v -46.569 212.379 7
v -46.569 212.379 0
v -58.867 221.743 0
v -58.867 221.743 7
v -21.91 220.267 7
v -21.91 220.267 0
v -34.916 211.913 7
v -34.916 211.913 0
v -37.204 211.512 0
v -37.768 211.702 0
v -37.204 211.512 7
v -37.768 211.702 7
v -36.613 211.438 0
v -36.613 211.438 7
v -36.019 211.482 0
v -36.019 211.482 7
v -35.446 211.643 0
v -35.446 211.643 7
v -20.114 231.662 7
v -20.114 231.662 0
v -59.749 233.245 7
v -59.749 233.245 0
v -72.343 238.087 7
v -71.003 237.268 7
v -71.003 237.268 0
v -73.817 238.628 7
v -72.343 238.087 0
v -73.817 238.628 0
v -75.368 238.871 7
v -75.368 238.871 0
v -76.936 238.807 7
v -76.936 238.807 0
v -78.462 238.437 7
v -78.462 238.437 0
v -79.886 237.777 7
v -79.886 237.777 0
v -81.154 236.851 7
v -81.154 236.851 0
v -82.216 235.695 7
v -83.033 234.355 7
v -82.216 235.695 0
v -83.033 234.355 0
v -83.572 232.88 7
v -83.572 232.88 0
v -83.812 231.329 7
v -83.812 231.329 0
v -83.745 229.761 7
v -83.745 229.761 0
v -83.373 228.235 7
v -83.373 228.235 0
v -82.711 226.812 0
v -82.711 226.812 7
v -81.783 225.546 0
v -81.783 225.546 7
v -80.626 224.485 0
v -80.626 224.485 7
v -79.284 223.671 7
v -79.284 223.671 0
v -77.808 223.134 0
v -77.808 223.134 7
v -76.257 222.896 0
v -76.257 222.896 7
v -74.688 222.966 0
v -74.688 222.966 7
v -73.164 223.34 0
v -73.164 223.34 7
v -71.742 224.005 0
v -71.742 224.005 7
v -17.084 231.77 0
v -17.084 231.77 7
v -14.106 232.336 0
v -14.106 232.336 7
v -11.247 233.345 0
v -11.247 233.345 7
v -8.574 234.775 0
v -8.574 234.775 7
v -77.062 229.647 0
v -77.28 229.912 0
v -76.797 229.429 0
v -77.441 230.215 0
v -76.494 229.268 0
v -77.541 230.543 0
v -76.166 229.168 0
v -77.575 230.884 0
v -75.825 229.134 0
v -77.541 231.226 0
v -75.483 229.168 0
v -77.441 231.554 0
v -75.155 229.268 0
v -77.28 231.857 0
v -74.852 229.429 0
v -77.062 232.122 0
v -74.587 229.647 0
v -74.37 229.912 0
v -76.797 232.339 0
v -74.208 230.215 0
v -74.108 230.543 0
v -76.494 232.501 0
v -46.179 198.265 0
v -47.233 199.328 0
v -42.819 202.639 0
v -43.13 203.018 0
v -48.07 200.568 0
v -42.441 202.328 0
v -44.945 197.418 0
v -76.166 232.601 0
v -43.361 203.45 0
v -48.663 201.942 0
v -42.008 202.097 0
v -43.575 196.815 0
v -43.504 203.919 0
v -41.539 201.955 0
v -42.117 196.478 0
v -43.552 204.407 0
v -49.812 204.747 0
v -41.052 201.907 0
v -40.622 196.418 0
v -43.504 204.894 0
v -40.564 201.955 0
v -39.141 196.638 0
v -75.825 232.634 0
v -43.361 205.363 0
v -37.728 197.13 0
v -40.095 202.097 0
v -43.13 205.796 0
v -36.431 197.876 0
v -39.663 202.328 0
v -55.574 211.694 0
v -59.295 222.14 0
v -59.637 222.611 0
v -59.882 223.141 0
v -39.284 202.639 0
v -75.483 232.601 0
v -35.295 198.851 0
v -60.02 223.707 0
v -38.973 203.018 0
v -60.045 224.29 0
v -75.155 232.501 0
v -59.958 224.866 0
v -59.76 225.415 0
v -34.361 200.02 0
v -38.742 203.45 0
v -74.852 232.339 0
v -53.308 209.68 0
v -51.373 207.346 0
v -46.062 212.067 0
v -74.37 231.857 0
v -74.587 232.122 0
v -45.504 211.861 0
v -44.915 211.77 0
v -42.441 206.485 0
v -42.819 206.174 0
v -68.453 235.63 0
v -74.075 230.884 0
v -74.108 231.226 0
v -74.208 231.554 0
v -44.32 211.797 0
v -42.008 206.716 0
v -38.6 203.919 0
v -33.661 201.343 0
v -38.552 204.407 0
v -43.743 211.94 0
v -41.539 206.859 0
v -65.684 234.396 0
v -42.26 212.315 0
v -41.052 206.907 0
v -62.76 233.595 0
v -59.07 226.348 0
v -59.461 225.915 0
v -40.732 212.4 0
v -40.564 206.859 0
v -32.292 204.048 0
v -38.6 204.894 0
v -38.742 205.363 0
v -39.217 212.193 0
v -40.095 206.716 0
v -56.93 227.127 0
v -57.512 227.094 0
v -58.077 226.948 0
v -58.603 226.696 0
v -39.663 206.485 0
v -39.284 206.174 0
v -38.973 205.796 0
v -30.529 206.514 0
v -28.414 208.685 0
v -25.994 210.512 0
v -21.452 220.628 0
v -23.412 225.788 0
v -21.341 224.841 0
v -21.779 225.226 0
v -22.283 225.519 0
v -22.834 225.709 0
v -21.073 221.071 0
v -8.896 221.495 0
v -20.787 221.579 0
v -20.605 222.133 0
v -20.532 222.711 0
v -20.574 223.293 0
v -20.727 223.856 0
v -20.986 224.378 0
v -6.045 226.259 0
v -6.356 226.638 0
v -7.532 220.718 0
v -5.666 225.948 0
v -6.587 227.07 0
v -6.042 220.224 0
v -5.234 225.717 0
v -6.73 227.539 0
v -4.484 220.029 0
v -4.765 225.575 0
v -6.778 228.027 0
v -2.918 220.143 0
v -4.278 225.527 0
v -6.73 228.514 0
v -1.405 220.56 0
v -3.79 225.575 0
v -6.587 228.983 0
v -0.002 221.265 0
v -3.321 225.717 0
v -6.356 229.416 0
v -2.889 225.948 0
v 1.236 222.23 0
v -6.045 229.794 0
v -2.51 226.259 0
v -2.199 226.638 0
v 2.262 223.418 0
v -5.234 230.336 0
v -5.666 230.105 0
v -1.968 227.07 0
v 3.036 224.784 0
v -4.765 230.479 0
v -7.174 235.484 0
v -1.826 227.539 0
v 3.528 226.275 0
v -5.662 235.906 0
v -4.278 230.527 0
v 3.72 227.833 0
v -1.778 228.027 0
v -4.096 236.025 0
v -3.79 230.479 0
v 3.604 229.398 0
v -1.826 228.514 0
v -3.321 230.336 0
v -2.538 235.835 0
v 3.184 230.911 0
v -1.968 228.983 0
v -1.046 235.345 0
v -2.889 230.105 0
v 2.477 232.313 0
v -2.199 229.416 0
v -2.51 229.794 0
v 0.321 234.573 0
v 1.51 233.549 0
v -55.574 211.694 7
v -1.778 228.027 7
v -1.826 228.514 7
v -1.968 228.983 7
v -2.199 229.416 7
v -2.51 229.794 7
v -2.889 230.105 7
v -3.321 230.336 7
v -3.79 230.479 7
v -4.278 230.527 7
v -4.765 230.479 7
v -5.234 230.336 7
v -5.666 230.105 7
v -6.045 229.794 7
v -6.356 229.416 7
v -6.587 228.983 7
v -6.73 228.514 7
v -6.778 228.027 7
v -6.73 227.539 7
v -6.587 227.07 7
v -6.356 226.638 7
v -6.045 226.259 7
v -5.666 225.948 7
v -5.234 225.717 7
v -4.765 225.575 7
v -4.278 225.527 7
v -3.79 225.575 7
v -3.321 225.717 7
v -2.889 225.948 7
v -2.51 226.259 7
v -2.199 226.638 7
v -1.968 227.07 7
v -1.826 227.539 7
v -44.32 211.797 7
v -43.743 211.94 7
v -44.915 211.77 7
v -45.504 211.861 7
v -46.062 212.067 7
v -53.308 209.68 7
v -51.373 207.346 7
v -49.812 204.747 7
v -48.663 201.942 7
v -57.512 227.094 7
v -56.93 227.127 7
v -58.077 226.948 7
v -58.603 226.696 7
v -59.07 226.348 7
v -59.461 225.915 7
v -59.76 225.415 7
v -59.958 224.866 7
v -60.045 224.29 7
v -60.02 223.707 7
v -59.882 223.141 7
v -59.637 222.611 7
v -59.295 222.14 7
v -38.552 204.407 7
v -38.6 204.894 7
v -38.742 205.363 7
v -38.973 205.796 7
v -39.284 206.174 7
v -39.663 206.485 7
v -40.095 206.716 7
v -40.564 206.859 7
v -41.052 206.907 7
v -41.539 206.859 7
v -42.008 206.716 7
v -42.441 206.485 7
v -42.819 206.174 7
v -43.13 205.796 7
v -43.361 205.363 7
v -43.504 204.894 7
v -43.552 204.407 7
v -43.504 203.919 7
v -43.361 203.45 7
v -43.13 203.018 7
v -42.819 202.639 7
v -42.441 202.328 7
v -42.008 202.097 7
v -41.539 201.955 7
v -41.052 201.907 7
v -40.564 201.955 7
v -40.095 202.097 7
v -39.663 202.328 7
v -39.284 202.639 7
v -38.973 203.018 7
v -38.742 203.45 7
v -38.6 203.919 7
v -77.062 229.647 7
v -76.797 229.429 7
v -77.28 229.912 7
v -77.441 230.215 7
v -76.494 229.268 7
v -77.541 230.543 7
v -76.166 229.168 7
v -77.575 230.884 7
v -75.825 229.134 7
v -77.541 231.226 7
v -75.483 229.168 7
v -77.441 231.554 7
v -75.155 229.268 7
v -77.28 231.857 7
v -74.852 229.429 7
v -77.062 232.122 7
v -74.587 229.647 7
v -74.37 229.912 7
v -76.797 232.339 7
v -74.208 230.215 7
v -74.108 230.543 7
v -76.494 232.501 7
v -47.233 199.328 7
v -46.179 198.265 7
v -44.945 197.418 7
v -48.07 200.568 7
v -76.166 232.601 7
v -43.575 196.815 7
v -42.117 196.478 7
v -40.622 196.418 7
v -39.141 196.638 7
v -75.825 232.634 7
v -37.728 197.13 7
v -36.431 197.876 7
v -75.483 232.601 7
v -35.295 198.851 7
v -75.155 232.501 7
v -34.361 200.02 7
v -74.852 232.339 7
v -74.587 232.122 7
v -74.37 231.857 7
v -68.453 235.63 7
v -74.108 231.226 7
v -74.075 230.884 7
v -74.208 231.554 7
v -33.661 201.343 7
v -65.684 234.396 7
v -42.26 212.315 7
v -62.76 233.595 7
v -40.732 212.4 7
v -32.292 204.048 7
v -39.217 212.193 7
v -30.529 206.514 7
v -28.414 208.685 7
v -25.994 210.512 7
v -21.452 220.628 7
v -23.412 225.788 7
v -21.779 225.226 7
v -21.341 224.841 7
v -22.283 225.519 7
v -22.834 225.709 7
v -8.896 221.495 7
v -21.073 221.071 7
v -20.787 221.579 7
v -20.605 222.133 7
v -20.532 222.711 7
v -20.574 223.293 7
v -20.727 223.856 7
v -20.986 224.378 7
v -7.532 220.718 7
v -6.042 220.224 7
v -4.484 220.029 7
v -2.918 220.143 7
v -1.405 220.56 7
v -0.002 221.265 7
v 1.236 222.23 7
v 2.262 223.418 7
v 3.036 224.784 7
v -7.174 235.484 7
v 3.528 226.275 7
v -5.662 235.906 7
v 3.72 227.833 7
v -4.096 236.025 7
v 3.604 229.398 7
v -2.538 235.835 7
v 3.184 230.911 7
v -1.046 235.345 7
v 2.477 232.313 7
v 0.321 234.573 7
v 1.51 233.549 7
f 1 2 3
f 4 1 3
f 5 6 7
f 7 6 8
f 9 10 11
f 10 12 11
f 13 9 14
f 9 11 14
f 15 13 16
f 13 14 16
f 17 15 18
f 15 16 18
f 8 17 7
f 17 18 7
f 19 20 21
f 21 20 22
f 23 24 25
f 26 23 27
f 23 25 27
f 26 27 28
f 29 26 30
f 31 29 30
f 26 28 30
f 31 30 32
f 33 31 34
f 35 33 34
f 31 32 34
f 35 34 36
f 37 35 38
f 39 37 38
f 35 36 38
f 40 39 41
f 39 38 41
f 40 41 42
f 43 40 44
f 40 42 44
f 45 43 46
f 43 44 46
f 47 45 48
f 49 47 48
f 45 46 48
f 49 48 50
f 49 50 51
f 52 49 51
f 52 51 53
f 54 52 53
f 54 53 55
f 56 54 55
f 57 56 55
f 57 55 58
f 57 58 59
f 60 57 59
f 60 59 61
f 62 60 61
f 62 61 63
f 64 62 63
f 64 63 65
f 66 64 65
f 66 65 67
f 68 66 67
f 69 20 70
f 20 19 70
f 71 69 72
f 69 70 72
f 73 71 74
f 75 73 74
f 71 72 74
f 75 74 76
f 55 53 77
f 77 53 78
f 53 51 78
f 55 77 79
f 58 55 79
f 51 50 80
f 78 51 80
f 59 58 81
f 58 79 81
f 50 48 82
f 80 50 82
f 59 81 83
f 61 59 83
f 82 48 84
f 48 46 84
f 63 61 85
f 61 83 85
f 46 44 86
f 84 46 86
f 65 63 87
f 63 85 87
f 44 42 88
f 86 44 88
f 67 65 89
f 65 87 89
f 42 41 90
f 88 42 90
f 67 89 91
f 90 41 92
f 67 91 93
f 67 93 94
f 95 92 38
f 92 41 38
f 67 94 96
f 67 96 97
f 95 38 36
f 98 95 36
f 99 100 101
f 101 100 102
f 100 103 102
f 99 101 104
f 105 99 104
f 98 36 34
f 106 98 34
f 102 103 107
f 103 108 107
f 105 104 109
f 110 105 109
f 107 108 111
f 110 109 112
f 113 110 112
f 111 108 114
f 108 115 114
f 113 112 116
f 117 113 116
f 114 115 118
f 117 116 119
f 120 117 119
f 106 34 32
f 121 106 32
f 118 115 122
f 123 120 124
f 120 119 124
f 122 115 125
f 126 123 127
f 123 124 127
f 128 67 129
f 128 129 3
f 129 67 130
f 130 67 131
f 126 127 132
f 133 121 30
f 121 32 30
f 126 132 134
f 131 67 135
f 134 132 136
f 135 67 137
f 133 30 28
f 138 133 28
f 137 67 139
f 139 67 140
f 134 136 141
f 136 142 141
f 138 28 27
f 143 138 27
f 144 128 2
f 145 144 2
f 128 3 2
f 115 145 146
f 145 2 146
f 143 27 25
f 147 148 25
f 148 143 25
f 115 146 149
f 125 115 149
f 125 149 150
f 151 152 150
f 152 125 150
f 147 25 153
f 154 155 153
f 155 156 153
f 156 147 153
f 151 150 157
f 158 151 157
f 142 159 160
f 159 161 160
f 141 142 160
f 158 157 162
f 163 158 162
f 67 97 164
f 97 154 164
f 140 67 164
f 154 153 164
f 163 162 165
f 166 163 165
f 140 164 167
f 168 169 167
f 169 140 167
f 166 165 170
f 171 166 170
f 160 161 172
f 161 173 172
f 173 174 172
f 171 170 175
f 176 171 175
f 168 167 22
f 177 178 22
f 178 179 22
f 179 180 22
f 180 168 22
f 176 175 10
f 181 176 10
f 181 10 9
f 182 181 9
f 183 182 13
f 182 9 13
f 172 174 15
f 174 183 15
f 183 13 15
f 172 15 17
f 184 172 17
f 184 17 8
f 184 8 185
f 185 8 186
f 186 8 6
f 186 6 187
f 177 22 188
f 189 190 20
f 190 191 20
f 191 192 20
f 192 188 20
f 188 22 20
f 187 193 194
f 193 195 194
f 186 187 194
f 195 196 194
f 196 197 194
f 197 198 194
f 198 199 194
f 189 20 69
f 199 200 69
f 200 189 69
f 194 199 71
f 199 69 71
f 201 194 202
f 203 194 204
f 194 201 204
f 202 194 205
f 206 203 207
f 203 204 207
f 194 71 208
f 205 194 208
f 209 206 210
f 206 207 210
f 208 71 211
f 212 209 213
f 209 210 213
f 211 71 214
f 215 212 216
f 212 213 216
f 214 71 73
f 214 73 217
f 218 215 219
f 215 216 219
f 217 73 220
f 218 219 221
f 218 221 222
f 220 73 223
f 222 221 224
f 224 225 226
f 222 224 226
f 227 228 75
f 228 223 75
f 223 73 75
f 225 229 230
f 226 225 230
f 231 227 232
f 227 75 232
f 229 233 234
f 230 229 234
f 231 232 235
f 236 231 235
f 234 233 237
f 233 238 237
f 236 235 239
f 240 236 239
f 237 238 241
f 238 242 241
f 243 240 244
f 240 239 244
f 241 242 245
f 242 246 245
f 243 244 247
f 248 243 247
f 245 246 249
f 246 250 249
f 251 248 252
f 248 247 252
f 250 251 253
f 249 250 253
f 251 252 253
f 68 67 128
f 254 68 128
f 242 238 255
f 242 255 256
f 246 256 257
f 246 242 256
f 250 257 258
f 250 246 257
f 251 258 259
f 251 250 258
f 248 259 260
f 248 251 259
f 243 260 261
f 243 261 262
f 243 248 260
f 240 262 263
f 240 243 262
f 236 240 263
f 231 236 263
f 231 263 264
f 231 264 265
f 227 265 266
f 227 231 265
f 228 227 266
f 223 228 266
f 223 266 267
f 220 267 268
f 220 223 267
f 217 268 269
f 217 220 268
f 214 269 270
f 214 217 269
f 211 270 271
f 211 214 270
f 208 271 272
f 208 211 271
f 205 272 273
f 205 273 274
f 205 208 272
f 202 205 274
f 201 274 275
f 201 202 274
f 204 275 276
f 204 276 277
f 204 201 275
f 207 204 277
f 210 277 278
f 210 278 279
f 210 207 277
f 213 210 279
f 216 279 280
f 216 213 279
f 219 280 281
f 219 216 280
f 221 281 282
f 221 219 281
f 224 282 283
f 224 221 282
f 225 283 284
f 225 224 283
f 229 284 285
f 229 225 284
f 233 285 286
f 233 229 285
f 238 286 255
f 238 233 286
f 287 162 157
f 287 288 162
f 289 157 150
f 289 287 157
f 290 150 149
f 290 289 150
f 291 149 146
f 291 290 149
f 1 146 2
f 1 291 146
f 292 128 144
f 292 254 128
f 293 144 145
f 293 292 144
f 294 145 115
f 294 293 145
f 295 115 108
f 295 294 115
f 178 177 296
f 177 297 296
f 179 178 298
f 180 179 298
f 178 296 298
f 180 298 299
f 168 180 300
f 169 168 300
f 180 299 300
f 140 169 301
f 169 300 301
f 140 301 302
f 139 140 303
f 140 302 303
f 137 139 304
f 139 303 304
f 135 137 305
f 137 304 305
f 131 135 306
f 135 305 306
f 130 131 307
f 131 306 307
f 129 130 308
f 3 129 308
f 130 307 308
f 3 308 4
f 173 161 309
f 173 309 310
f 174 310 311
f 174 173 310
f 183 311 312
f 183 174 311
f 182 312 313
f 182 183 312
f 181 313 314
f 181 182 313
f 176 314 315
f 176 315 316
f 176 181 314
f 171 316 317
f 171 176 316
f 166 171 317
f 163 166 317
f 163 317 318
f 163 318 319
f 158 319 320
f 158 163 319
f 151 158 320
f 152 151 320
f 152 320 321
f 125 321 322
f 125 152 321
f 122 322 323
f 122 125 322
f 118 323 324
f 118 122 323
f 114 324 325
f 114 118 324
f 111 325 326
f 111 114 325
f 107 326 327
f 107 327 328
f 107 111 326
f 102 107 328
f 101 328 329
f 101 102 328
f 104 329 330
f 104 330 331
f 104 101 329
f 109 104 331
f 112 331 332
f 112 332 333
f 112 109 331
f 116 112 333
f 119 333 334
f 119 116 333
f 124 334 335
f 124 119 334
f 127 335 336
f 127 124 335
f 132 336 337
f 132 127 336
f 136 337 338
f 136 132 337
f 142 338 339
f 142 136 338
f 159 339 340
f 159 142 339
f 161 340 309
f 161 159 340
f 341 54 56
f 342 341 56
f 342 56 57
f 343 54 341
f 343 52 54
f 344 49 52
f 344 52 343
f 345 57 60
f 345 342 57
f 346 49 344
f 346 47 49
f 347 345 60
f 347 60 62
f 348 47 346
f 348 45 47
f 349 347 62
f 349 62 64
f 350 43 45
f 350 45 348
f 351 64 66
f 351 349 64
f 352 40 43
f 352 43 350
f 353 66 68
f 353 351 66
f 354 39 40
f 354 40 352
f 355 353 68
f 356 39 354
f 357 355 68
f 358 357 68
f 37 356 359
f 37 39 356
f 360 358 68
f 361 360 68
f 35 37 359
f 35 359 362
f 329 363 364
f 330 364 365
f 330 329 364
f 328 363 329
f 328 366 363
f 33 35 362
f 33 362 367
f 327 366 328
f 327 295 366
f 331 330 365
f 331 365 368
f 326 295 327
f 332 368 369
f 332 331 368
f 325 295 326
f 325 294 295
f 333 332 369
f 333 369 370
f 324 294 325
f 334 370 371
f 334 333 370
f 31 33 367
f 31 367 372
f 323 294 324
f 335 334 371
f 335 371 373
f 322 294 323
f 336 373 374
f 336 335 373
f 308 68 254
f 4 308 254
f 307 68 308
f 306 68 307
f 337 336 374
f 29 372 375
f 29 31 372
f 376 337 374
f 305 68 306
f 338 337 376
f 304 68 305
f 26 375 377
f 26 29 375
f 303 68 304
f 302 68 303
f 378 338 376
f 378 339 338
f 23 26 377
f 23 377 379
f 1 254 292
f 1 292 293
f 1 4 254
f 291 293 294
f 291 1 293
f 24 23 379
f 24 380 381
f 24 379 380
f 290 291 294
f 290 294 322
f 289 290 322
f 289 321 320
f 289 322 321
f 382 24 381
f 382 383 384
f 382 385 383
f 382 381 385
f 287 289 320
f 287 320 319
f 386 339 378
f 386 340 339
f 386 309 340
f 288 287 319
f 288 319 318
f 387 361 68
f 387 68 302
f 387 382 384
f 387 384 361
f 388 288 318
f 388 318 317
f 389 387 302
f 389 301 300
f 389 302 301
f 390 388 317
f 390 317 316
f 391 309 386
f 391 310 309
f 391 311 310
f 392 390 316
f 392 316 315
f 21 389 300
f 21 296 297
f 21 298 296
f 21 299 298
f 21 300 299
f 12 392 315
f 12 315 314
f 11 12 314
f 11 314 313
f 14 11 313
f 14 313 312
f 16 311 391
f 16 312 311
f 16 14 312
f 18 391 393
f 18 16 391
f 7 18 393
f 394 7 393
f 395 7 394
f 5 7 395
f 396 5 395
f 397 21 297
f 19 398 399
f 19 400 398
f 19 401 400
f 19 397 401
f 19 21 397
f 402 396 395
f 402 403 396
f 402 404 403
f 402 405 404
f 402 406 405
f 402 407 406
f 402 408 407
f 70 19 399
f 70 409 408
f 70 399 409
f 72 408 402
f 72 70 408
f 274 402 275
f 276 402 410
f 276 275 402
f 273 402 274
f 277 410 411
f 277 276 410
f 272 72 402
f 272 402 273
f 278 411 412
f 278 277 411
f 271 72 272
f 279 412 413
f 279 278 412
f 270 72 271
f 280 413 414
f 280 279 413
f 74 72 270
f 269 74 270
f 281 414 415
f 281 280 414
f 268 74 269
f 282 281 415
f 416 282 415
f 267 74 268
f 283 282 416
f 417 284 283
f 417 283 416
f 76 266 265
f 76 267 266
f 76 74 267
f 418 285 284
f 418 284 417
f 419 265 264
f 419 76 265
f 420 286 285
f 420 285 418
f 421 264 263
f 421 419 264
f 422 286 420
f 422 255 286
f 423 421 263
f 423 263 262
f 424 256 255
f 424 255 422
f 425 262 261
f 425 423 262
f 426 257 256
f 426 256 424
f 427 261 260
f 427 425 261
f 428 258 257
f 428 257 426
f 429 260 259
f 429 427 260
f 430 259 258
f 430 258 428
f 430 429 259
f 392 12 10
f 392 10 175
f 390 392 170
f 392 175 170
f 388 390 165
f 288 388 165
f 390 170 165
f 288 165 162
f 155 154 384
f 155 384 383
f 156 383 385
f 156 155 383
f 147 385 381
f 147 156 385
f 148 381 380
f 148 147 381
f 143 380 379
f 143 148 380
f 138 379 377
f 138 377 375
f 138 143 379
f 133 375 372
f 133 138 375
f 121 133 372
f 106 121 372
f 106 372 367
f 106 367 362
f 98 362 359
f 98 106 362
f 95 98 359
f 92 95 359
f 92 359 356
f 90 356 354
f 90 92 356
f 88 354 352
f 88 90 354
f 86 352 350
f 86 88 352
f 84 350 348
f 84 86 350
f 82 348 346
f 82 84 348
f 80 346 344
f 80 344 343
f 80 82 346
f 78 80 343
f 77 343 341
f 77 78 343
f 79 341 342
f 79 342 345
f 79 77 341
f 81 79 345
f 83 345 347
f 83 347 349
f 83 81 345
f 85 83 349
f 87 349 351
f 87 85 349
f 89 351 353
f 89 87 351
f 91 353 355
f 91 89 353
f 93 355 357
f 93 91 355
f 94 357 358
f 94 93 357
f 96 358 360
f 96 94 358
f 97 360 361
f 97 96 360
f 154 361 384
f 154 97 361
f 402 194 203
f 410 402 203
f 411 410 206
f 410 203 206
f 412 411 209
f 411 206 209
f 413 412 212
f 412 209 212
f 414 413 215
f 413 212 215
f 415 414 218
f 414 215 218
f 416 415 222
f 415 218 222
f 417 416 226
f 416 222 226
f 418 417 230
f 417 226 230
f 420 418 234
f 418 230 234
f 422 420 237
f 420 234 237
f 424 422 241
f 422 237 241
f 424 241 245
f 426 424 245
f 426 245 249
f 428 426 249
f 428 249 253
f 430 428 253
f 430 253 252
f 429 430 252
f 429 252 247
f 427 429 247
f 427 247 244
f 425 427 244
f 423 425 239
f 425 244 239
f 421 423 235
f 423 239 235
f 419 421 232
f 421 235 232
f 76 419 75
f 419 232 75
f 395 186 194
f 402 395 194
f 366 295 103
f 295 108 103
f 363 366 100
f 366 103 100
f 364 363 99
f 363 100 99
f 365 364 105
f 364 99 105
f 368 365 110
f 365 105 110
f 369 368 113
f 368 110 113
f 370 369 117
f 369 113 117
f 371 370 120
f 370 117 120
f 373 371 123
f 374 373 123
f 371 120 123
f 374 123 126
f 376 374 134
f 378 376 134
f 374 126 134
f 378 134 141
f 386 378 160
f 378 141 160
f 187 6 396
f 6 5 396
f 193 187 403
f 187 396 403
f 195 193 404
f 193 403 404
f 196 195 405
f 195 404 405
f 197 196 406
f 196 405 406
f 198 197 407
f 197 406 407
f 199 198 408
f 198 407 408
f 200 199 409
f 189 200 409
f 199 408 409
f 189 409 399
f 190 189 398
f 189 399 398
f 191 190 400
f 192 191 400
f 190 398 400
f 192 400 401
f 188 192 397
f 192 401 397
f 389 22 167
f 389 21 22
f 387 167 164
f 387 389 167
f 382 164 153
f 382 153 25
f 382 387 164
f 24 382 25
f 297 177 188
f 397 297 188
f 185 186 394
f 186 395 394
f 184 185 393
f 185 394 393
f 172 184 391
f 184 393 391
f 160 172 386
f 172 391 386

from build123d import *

# Parameters (mm, degrees)
SKETCH2_R             = 8
SKETCH2_R_2           = 2.5
BOSS_EXTRUDE2_DEPTH   = 7
BOSS_EXTRUDE2_2_DEPTH = 7
SKETCH2_R_3           = 1.75
BOSS_EXTRUDE2_3_DEPTH = 7
BOSS_EXTRUDE3_DEPTH   = 7
FILLET4_R             = 3
FILLET5_R             = 20
FILLET6_R             = 20


with BuildPart() as part:
    # Sketch2 → Boss-Extrude2 (new body)
    with BuildSketch(Plane.XY):
        with Locations((-41.051610566, 204.406598272)):
            Circle(SKETCH2_R)
        with Locations((-41.051610566, 204.406598272)):
            Circle(SKETCH2_R_2, mode=Mode.SUBTRACT)
    extrude(amount=BOSS_EXTRUDE2_DEPTH)



with BuildPart() as body_2:
    # Sketch2 → Boss-Extrude2 2 (new body)
    with BuildSketch(Plane.XY):
        with Locations((-4.277553922, 228.026598272)):
            Circle(SKETCH2_R)
        with Locations((-4.277553922, 228.026598272)):
            Circle(SKETCH2_R_2, mode=Mode.SUBTRACT)
    extrude(amount=BOSS_EXTRUDE2_2_DEPTH)


with BuildPart() as body_3:
    # Sketch2 → Boss-Extrude2 3 (new body)
    with BuildSketch(Plane.XY):
        with Locations((-75.824618393, 230.884392152)):
            Circle(SKETCH2_R)
        with Locations((-75.824618394, 230.884392152)):
            Circle(SKETCH2_R_3, mode=Mode.SUBTRACT)
    extrude(amount=BOSS_EXTRUDE2_3_DEPTH)


with BuildPart() as part_1:
    add(part.part)

    add(body_2.part)  # Boss-Extrude3 merges body 2

    add(body_3.part)  # Boss-Extrude3 merges body 3
    # Sketch2<6> → Boss-Extrude3 (add)
    with BuildSketch(Plane.XY):
        with BuildLine():
            ThreePointArc((-36.432963635, 210.938680676), (-34.320479367, 208.730008128), (-33.190406244, 205.890332276))
            Line((-33.190406244, 205.890332276), (-8.896200854, 221.494515869))
            ThreePointArc((-8.896200854, 221.494515869), (-11.997222262, 225.927379197), (-11.568110377, 231.32019609))
            Line((-11.568110377, 231.32019609), (-68.294595771, 233.586013758))
            ThreePointArc((-68.294595771, 233.586013758), (-68.296973695, 228.176151893), (-71.741674269, 224.004743376))
            Line((-71.741674269, 224.004743376), (-48.769430485, 206.512602952))
            ThreePointArc((-48.769430485, 206.512602952), (-47.416469362, 209.253099331), (-45.134554691, 211.286247048))
            Line((-45.134554691, 211.286247048), (-66.437148094, 227.507037612))
            Line((-66.437148094, 227.507037612), (-13.90449039, 225.408733387))
            Line((-13.90449039, 225.408733387), (-36.432963635, 210.938680676))
        make_face()
    extrude(amount=BOSS_EXTRUDE3_DEPTH)

    # Fillet4
    fillet4_edges = [part_1.edges().sort_by_distance(p)[0] for p in [
        (-45.134554691, 211.286247048, 3.5),
        (-36.432963635, 210.938680676, 3.5),
        (-13.90449039, 225.408733387, 3.5),
        (-66.437148094, 227.507037612, 3.5),
    ]]
    fillet(fillet4_edges, radius=FILLET4_R)

    # Fillet5
    fillet5_edges = [part_1.edges().sort_by_distance(p)[0] for p in [
        (-11.568110377, 231.32019609, 3.5),
        (-68.294595771, 233.586013758, 3.5),
    ]]
    fillet(fillet5_edges, radius=FILLET5_R)

    # Fillet6
    fillet6_edges = [part_1.edges().sort_by_distance(p)[0] for p in [
        (-33.190406244, 205.890332276, 3.5),
        (-48.769430485, 206.512602952, 3.5),
    ]]
    fillet(fillet6_edges, radius=FILLET6_R)


solid = part_1.part
